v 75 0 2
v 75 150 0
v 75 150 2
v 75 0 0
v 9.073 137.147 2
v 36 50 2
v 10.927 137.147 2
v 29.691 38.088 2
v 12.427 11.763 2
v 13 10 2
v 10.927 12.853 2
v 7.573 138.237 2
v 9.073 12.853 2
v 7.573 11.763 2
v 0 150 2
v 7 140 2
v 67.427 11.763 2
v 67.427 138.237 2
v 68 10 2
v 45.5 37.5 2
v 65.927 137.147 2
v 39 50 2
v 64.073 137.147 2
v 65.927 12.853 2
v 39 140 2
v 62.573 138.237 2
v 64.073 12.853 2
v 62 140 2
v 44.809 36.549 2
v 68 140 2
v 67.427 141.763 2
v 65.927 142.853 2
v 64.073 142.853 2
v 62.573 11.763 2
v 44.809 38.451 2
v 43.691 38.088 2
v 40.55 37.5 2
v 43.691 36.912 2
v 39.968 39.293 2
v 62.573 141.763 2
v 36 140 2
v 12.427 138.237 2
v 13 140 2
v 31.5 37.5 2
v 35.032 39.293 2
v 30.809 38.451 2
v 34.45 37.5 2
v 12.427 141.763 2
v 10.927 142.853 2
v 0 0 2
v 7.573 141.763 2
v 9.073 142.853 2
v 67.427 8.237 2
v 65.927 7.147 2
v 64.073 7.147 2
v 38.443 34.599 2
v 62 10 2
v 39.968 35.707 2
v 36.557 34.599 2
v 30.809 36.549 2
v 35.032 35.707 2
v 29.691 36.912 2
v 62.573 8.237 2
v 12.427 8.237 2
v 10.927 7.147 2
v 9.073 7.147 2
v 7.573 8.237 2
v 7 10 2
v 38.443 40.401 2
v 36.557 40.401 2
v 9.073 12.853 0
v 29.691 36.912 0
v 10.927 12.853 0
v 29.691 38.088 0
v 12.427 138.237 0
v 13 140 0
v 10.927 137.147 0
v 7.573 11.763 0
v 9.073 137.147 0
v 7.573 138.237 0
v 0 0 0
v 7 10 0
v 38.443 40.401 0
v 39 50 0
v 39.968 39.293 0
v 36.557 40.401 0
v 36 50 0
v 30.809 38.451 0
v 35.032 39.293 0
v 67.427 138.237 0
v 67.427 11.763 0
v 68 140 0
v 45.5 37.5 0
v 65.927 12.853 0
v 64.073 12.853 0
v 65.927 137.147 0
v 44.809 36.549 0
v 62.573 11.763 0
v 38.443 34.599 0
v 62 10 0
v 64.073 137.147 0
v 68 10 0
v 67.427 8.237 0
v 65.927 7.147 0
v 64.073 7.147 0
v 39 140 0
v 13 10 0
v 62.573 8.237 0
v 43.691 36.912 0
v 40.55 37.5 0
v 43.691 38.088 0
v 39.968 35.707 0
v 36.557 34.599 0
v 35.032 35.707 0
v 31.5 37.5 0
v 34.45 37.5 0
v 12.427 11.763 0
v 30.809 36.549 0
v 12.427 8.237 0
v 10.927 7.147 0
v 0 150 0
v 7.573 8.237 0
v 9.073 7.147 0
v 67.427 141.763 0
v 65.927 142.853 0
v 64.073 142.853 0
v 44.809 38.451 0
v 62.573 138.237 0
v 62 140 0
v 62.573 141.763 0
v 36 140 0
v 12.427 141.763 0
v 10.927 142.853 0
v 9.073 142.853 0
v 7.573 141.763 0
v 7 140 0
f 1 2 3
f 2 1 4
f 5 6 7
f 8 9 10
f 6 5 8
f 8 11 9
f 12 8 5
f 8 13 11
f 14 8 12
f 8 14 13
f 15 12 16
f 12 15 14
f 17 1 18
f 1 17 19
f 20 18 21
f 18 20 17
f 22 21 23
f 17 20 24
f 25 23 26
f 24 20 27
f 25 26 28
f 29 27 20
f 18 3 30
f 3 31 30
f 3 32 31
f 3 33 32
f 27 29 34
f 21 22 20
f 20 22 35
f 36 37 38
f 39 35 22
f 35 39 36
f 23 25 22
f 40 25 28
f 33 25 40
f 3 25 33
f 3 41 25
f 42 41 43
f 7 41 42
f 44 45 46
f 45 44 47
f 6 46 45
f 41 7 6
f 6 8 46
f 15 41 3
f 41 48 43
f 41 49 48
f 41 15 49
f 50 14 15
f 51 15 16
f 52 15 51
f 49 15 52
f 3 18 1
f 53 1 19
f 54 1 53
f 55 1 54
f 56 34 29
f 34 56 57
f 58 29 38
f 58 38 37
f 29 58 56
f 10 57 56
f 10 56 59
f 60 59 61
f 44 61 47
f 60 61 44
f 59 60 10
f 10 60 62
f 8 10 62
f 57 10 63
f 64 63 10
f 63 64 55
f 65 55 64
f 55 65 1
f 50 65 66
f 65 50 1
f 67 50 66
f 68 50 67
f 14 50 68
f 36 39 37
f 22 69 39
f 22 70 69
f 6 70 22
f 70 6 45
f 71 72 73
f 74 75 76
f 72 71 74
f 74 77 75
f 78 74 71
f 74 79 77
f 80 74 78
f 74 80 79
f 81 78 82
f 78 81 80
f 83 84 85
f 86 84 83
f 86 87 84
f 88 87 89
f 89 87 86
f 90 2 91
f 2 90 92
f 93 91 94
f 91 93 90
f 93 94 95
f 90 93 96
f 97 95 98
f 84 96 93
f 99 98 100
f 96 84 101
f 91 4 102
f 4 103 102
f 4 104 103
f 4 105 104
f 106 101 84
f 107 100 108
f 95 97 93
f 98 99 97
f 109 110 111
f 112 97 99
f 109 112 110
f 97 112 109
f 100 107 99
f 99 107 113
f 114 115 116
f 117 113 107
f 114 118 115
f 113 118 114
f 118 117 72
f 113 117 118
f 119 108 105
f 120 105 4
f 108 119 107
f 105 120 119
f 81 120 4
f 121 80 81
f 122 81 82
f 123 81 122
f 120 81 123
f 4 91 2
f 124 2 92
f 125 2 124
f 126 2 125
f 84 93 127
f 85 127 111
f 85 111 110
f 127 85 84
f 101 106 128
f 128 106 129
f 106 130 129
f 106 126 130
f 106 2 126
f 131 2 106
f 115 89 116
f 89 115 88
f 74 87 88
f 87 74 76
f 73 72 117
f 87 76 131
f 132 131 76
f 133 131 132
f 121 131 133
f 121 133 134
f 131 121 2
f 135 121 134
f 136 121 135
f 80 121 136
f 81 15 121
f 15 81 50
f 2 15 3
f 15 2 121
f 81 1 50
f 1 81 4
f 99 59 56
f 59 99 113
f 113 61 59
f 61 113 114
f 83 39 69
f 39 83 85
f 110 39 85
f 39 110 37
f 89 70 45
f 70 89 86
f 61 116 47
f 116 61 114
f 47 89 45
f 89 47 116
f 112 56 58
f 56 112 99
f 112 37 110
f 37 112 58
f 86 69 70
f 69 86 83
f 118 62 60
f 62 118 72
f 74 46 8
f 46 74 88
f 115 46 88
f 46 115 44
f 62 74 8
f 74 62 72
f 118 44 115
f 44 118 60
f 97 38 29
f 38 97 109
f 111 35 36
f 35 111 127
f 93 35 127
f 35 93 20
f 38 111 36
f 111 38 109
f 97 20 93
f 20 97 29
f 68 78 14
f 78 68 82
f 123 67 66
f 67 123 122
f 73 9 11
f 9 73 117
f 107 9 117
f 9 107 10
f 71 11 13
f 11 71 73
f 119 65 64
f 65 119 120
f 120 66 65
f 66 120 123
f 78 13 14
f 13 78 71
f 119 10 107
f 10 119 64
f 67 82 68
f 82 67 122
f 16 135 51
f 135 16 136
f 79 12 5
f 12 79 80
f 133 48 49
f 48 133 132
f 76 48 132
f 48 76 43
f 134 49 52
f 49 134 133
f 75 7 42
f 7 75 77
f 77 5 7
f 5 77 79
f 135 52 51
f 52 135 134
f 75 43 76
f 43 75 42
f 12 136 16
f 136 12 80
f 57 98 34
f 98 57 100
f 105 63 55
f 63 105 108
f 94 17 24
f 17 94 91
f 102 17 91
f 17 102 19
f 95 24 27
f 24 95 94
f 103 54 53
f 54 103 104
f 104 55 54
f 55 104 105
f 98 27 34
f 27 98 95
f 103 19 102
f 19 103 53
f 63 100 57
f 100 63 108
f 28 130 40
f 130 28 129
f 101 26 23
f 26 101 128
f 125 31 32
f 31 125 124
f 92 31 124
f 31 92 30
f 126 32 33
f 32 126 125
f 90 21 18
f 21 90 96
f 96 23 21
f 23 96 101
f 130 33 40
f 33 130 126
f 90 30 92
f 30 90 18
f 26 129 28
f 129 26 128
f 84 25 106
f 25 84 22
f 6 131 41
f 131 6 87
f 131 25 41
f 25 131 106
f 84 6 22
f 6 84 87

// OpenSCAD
difference() {

 cube([75, 150, 2]);
 
 // Motor shaft   
 translate([75/2, 75/2, -1])
 cylinder(d = 6.1, h = 4);   
    
 // Motor holders   
 translate([75/2 - 7, 75/2, -1])
 cylinder(d = 2, h = 4);
 translate([75/2 + 7, 75/2, -1])
 cylinder(d = 2, h = 4);
   
 // Base holders
 translate([10, 10, -1])
 cylinder(d = 6, h = 4);
 translate([10, 150 - 10, -1])
 cylinder(d = 6, h = 4);
 translate([75 - 10 , 10, -1])
 cylinder(d = 6, h = 4);
 translate([75 - 10, 150 - 10, -1])
 cylinder(d = 6, h = 4);
 
 // hole
 translate([75/2 - 1.5, 50, -1])
 cube([3, 90, 4]);
}
